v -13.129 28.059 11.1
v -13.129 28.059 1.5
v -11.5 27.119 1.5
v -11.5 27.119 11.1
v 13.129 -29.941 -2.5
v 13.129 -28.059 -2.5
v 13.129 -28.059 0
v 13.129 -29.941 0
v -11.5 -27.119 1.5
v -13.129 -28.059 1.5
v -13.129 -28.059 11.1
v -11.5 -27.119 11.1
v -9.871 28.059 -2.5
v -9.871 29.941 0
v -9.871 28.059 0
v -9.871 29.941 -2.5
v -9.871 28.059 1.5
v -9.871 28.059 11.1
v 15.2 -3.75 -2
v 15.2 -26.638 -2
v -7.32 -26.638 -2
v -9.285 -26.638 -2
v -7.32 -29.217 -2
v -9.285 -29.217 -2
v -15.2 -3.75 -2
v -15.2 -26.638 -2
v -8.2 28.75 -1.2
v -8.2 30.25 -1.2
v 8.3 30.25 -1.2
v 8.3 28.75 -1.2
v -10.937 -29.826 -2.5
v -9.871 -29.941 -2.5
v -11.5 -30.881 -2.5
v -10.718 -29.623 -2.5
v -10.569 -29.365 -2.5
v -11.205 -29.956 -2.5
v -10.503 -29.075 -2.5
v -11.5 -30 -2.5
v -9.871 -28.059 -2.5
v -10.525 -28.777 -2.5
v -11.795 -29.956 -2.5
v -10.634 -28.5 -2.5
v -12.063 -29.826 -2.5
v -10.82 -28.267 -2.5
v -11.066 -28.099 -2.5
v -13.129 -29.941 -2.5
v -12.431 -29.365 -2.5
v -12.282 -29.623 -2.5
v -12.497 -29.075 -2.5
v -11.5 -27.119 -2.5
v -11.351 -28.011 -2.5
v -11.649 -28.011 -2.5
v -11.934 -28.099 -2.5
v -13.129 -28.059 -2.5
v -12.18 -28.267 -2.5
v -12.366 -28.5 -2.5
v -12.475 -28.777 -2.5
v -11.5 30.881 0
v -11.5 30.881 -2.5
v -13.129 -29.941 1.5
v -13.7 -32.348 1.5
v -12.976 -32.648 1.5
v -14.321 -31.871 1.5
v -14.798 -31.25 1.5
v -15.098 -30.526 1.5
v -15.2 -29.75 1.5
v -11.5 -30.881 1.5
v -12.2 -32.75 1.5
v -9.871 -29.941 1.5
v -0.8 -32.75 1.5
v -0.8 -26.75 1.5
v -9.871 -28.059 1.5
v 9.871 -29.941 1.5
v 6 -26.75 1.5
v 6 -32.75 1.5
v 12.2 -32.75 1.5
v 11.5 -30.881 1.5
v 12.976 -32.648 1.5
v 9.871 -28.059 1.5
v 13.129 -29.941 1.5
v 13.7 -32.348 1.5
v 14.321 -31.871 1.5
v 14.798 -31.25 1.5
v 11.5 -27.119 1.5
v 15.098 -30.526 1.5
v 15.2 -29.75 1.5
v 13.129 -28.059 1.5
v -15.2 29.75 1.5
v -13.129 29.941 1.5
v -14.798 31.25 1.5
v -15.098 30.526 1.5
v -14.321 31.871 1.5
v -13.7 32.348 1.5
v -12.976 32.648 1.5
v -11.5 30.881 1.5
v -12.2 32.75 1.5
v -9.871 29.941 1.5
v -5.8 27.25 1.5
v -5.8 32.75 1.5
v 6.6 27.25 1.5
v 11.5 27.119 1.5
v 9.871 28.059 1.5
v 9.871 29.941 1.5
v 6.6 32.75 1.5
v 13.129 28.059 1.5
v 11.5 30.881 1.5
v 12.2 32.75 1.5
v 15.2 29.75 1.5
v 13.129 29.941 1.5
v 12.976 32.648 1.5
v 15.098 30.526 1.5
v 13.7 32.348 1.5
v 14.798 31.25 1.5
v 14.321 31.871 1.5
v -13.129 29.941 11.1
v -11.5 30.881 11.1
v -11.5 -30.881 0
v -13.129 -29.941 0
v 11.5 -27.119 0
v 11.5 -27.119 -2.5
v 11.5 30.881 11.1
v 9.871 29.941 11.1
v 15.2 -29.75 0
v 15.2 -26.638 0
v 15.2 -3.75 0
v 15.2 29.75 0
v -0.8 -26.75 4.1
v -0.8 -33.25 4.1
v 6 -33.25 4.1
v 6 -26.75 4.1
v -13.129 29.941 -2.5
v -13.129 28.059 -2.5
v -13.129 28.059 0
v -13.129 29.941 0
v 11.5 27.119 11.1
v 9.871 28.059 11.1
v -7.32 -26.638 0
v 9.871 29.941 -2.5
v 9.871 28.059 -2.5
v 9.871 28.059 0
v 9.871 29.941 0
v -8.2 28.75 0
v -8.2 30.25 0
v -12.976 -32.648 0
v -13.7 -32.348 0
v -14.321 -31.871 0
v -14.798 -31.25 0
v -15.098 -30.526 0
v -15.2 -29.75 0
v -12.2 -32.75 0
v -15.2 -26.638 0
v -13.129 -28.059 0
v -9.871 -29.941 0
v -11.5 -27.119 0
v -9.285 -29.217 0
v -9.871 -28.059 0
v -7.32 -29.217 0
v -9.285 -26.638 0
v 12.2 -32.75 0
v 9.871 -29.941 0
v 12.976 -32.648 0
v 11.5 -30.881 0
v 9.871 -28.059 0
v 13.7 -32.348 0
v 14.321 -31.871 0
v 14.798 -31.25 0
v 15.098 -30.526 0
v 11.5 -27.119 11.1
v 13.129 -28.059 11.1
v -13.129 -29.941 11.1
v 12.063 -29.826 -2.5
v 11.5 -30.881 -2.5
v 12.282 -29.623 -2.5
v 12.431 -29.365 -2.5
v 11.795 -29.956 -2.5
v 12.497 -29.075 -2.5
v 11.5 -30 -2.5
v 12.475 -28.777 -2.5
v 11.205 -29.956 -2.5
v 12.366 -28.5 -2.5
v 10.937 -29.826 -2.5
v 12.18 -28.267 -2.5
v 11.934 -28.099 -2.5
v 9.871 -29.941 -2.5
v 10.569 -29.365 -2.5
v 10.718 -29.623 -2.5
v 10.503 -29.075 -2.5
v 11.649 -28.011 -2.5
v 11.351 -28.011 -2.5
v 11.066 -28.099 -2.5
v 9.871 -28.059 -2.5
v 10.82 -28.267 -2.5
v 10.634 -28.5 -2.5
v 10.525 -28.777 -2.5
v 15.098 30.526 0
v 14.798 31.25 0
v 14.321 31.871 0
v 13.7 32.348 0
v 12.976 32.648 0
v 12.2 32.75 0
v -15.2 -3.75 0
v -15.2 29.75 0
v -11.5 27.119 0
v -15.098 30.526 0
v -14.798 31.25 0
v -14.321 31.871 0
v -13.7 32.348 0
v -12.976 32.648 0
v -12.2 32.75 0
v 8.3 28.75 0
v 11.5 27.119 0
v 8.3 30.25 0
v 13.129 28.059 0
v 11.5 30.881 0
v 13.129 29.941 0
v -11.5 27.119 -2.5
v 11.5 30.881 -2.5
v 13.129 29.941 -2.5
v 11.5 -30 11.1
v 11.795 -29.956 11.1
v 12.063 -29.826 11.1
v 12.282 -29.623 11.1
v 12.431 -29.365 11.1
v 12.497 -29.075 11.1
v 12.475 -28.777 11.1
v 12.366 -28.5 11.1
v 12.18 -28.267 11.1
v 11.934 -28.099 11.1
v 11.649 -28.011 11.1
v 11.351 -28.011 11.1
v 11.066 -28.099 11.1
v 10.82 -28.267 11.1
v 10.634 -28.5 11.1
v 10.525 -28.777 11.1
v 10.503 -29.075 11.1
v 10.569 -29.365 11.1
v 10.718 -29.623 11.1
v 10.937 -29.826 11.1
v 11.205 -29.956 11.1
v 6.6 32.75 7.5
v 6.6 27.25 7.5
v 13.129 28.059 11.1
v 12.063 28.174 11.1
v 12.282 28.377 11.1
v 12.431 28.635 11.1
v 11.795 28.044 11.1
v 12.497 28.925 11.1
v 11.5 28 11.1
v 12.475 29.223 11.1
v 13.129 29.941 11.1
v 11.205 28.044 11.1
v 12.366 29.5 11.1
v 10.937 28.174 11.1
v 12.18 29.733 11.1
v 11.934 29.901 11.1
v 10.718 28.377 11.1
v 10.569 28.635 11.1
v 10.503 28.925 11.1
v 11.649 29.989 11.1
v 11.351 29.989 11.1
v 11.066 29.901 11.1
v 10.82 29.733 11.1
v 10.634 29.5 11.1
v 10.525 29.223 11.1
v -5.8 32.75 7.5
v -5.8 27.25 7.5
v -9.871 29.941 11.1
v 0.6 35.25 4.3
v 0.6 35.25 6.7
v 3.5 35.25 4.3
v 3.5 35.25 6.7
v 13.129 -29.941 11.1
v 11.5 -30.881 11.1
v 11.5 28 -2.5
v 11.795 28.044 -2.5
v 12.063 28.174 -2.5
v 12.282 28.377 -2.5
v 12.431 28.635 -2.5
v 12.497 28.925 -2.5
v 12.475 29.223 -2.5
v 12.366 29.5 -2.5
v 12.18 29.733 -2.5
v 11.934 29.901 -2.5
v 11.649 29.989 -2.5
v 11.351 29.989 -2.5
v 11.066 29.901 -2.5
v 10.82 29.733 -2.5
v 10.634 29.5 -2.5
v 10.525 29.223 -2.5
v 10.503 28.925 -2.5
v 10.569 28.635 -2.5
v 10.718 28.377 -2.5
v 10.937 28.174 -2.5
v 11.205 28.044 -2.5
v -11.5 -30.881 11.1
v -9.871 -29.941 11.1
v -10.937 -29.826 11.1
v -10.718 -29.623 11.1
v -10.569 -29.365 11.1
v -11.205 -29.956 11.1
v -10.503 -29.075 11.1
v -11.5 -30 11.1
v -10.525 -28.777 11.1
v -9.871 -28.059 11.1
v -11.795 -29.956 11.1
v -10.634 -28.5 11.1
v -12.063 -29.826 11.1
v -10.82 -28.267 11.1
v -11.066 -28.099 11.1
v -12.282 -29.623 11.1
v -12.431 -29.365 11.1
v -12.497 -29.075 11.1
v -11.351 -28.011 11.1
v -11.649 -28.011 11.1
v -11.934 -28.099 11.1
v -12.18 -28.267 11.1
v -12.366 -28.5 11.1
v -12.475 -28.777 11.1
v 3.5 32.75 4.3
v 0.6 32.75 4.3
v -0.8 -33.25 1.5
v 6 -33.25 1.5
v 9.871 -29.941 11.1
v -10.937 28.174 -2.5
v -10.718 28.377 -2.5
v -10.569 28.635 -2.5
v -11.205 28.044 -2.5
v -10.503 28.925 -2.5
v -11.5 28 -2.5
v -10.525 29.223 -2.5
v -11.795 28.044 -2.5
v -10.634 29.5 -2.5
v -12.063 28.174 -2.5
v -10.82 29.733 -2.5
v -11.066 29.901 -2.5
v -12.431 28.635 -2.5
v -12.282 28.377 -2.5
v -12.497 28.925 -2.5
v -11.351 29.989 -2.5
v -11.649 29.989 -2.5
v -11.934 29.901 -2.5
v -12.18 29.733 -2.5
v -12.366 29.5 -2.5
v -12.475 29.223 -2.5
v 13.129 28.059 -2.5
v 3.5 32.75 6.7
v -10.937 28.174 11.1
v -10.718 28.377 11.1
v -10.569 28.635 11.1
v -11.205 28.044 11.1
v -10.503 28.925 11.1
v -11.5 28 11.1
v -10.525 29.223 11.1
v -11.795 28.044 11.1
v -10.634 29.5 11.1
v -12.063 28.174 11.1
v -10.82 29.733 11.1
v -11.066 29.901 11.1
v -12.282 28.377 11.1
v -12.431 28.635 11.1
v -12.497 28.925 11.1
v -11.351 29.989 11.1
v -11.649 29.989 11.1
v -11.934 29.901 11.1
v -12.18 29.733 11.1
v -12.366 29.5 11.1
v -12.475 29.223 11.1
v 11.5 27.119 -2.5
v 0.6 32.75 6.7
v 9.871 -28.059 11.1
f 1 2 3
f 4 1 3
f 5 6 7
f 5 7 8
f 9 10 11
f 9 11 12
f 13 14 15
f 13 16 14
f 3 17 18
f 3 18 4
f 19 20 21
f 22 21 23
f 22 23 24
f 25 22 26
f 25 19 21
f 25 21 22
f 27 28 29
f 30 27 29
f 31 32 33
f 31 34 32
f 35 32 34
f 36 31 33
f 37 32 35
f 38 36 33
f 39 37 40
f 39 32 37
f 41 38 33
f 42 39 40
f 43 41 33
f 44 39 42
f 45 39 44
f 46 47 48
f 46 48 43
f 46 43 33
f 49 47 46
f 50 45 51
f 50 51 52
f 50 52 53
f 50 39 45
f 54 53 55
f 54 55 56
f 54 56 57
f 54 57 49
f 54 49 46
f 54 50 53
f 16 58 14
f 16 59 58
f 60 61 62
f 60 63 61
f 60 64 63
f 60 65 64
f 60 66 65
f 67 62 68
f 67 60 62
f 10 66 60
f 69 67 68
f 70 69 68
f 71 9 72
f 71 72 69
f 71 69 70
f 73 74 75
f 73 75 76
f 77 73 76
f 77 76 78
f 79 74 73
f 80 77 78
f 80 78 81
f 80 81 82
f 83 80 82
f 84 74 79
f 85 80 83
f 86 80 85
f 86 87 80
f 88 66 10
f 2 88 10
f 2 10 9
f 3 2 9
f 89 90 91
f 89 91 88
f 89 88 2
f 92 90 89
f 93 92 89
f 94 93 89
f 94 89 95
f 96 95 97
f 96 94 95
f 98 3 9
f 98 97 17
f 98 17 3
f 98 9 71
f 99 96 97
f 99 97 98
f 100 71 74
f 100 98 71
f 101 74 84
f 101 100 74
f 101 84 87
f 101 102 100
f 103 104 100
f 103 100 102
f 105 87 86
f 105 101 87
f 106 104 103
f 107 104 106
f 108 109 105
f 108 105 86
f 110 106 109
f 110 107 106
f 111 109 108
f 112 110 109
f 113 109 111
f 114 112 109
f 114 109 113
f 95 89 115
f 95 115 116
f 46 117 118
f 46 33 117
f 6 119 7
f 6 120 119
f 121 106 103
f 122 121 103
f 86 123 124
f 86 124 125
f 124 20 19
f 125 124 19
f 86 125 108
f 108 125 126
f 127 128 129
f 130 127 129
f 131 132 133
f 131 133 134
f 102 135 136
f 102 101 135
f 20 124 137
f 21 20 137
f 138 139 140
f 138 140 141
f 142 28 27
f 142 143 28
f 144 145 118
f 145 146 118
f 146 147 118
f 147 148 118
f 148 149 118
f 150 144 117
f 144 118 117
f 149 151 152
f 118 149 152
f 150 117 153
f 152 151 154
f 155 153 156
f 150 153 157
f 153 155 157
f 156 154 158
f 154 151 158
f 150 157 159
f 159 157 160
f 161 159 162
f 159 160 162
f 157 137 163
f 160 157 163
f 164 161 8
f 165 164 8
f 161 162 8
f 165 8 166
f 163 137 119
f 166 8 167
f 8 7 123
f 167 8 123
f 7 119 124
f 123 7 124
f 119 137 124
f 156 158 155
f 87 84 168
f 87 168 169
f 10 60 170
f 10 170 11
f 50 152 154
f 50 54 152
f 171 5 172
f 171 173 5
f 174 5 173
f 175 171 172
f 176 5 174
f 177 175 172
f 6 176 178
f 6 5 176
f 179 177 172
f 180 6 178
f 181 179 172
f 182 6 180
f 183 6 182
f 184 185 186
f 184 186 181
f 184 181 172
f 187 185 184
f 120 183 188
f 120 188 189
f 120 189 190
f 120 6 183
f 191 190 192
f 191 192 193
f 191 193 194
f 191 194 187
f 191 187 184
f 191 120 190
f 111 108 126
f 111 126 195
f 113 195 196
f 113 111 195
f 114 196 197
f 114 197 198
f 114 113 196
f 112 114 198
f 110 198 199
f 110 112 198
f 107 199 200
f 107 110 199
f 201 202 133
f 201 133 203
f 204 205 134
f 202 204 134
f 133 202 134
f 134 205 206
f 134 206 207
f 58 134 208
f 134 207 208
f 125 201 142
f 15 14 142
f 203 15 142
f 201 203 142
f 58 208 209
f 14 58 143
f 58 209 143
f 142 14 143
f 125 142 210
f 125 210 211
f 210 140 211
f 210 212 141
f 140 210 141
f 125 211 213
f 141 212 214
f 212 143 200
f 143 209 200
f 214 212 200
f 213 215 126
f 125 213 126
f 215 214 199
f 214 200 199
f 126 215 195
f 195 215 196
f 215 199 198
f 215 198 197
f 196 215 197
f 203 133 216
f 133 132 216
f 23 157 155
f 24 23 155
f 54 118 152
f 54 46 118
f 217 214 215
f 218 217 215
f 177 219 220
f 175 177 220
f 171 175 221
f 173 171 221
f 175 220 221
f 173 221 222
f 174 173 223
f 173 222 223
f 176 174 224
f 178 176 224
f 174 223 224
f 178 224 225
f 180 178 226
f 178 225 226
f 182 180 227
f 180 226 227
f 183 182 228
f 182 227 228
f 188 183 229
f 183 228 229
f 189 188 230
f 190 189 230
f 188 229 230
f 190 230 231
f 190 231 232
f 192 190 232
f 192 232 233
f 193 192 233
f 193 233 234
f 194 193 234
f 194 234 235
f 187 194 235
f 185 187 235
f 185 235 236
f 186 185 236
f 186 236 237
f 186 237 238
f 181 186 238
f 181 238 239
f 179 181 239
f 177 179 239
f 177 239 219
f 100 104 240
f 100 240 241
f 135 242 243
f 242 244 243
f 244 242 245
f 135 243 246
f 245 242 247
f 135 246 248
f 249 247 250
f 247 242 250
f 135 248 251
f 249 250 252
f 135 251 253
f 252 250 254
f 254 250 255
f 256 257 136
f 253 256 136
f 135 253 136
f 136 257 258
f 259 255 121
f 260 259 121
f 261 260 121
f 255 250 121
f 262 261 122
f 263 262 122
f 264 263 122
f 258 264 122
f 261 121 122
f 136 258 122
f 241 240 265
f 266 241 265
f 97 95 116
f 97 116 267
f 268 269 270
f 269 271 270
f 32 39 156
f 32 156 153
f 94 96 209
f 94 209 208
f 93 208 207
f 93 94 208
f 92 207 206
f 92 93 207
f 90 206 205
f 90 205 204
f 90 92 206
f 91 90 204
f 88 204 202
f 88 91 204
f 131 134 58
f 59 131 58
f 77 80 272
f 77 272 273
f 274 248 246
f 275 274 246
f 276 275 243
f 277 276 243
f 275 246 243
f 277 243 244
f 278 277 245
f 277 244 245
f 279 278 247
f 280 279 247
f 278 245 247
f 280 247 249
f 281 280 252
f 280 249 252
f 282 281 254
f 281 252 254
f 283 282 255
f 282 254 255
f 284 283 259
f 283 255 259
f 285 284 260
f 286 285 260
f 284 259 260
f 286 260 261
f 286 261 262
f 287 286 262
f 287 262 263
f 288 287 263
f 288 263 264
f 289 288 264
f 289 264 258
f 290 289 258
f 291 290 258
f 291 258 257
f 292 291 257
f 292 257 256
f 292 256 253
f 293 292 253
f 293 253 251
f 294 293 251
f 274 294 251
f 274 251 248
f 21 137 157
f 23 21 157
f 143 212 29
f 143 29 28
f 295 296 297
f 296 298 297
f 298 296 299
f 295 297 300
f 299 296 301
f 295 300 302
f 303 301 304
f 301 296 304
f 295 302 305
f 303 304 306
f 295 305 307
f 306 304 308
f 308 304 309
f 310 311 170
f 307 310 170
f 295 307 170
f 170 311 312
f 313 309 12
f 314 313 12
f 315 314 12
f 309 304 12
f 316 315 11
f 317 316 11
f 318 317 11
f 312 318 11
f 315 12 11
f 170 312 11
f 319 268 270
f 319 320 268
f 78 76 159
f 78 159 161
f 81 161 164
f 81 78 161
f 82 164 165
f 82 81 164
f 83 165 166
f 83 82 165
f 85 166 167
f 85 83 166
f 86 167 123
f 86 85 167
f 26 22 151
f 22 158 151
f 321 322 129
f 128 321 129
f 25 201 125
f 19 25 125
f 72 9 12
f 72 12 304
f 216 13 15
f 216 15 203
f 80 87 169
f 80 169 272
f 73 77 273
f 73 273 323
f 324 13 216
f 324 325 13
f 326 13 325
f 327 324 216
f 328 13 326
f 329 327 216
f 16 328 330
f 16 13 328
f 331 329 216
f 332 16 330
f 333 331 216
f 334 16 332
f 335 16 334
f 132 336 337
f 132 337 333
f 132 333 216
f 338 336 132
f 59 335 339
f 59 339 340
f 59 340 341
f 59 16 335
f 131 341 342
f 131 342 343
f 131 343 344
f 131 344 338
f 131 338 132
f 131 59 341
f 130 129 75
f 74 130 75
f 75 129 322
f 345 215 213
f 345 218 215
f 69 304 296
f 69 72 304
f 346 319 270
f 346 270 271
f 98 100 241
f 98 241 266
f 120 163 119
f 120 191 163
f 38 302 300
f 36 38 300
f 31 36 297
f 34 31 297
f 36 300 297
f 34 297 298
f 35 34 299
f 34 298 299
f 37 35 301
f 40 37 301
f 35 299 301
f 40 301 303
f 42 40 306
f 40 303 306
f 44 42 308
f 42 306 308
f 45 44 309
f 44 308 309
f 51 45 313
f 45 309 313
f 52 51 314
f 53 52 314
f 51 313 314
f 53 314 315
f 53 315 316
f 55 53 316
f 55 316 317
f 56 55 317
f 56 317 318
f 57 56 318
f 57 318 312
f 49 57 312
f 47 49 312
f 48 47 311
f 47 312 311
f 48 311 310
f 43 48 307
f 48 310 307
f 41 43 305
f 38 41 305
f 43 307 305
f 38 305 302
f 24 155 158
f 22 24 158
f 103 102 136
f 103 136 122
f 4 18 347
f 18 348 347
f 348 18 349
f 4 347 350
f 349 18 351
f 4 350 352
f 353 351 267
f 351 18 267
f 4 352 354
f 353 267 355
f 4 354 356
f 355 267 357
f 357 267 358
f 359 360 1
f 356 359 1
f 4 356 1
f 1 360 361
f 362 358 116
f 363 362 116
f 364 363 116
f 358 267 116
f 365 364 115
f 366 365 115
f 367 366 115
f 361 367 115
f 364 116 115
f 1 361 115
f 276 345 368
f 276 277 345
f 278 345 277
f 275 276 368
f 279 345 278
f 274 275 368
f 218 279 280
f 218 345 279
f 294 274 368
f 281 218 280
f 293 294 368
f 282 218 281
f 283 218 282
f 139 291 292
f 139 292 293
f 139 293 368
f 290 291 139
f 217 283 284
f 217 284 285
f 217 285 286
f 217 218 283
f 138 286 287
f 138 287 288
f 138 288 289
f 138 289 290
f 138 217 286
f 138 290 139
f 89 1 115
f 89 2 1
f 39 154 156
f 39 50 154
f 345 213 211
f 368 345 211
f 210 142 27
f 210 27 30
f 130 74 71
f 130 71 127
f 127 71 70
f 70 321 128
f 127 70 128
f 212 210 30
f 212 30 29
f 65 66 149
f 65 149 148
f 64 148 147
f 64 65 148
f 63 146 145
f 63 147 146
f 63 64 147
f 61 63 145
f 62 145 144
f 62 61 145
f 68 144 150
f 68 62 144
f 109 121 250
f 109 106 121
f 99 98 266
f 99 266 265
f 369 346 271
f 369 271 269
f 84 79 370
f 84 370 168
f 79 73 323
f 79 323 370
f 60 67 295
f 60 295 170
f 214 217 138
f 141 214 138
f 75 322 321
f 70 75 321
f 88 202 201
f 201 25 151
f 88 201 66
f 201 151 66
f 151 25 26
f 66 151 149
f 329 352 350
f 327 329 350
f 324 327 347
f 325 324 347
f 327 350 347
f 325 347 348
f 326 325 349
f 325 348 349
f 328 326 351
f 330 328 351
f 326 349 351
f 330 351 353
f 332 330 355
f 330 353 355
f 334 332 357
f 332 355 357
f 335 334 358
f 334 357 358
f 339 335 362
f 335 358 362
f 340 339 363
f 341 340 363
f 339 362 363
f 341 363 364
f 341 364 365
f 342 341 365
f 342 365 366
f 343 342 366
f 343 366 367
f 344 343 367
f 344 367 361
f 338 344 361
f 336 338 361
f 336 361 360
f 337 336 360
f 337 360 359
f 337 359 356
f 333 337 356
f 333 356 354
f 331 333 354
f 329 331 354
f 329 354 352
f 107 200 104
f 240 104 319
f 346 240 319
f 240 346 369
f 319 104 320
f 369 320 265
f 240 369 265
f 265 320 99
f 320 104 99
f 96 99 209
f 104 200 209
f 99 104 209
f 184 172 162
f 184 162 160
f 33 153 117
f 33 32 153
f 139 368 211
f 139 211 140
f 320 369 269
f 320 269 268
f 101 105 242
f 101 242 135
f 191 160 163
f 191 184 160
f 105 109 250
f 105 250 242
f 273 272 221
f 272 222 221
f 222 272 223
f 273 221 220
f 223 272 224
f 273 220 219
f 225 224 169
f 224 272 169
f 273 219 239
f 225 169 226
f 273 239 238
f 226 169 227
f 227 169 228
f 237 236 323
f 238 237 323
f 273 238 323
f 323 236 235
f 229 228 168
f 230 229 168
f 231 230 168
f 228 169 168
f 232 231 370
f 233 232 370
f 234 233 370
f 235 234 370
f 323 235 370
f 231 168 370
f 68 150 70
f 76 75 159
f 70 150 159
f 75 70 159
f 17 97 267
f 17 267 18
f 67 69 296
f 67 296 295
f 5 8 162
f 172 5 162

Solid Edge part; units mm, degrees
sketch "Sketch1" plane through (0, 0, 0) normal (0, 0, 1) x (1, 0, 0)
  line L0 (-15.2, -32.75) -> (15.2, -32.75)
  line L1 (15.2, -32.75) -> (15.2, 32.75)
  line L2 (15.2, 32.75) -> (-15.2, 32.75)
  line L3 (-15.2, 32.75) -> (-15.2, -32.75)
  dimension "D1" = 30.4
  dimension "D2" = 65.5
extrude "Protrusion1" add sketch "Sketch1" along normal blind 1.5
fillet "Verrundung_1" radius 3 4 edges at (15.2, -32.75, 0.75) (-15.2, -32.75, 0.75) (15.2, 32.75, 0.75) (-15.2, 32.75, 0.75)
sketch "Sketch2" plane through (0, 0, 1.5) normal (0, 0, 1) x (0, -1, 0)
  line L0 (-29.9407, 13.1293) -> (-28.0593, 13.1293)
  line L1 (-28.0593, 13.1293) -> (-27.1186, 11.5)
  line L2 (-27.1186, 11.5) -> (-28.0593, 9.8707)
  line L3 (-28.0593, 9.8707) -> (-29.9407, 9.8707)
  line L4 (-30.8814, 11.5) -> (-29.9407, 9.8707)
  line L5 (-30.8814, 11.5) -> (-29.9407, 13.1293)
  line L6 (-29.9407, -9.8707) -> (-28.0593, -9.8707)
  line L7 (-28.0593, -9.8707) -> (-27.1186, -11.5)
  line L8 (-28.0593, -13.1293) -> (-27.1186, -11.5)
  line L9 (-28.0593, -13.1293) -> (-29.9407, -13.1293)
  line L10 (-29.9407, -13.1293) -> (-30.8814, -11.5)
  line L11 (-30.8814, -11.5) -> (-29.9407, -9.8707)
  line L12 (28.0593, 13.1293) -> (29.9407, 13.1293)
  line L13 (29.9407, 13.1293) -> (30.8814, 11.5)
  line L14 (30.8814, 11.5) -> (29.9407, 9.8707)
  line L15 (29.9407, 9.8707) -> (28.0593, 9.8707)
  line L16 (28.0593, 9.8707) -> (27.1186, 11.5)
  line L17 (27.1186, 11.5) -> (28.0593, 13.1293)
  line L18 (28.0593, -9.8707) -> (29.9407, -9.8707)
  line L19 (29.9407, -9.8707) -> (30.8814, -11.5)
  line L20 (30.8814, -11.5) -> (29.9407, -13.1293)
  line L21 (29.9407, -13.1293) -> (28.0593, -13.1293)
  line L22 (28.0593, -13.1293) -> (27.1186, -11.5)
  line L23 (27.1186, -11.5) -> (28.0593, -9.8707)
  dimension "D1" = 58
  dimension "D2" = 23
extrude "Extrusionsausprägung_2" add sketch "Sketch2" along normal blind 9.6 and the other way blind 4
sketch "Sketch3" plane through (0, -32.75, 0.75) normal (0, -1, 0) x (1, 0, 0)
  line L0 (-0.8, 0.75) -> (-0.8, 3.35)
  line L1 (-0.8, 3.35) -> (6, 3.35)
  line L2 (6, 3.35) -> (6, 0.75)
  line L3 (6, 0.75) -> (-0.8, 0.75)
  dimension "D1" = 6.8
  dimension "D2" = 2.6
  dimension "D3" = 16
extrude "Extrusionsausprägung_3" add sketch "Sketch3" against normal blind 6 and the other way blind 0.5
sketch "Sketch4" plane through (0, 0, 1.5) normal (0, 0, 1) x (0, -1, 0)
  line L0 (-32.75, 6.6) -> (-27.25, 6.6)
  line L1 (-27.25, 6.6) -> (-27.25, -5.8)
  line L2 (-27.25, -5.8) -> (-32.75, -5.8)
  line L3 (-32.75, -5.8) -> (-32.75, 6.6)
  dimension "D1" = 12.4
  dimension "D2" = 5.5
  dimension "D3" = 21.8
extrude "Extrusionsausprägung_4" add sketch "Sketch4" along normal blind 6
sketch "Sketch5" plane through (0, 32.75, 3.75) normal (0, 1, 0) x (-1, 0, 0)
  line L0 (-3.5, 2.95) -> (-0.6, 2.95)
  line L1 (-0.6, 2.95) -> (-0.6, 0.55)
  line L2 (-0.6, 0.55) -> (-3.5, 0.55)
  line L3 (-3.5, 0.55) -> (-3.5, 2.95)
  dimension "D1" = 2.4
  dimension "D2" = 2.9
  dimension "D3" = 6
  dimension "D4" = 3.2
extrude "Extrusionsausprägung_5" add sketch "Sketch5" along normal blind 2.5
sketch "Sketch6" plane through (11.5, 29, 11.1) normal (0, 0, 1) x (0, -1, 0)
  circle A0 centre (0, 0) radius 1
  circle A1 centre (0, -23) radius 1
  circle A2 centre (58, -23) radius 1
  circle A3 centre (58, 0) radius 1
  dimension "D1" = 2
extrude "Cutout1" cut sketch "Sketch6" against normal through all
sketch "Sketch7" plane through (0, 0, 0) normal (0, 0, -1) x (0, -1, 0)
  line L0 (-30.25, 8.2) -> (-28.75, 8.2)
  line L1 (-28.75, 8.2) -> (-28.75, -8.3)
  line L2 (-28.75, -8.3) -> (-30.25, -8.3)
  line L3 (-30.25, -8.3) -> (-30.25, 8.2)
  dimension "D1" = 1.5
  dimension "D2" = 16.5
  dimension "D3" = 2.5
  dimension "D4" = 7
extrude "Extrusionsausprägung_6" add sketch "Sketch7" along normal blind 1.2
sketch "Sketch8" plane through (0, 0, 0) normal (0, 0, -1) x (0, -1, 0)
  line L0 (3.75, 15.2) -> (3.75, -15.2)
  line L1 (3.75, -15.2) -> (26.638, -15.2)
  line L2 (26.638, -15.2) -> (26.638, 7.3196)
  line L3 (26.638, 7.3196) -> (29.2171, 7.3196)
  line L4 (29.2171, 7.3196) -> (29.2171, 9.2846)
  line L5 (29.2171, 9.2846) -> (26.638, 9.2846)
  line L6 (26.638, 9.2846) -> (26.638, 15.2)
  line L7 (26.638, 15.2) -> (3.75, 15.2)
  dimension "D1" = 29
extrude "Extrusionsausprägung_7" add sketch "Sketch8" along normal blind 2
